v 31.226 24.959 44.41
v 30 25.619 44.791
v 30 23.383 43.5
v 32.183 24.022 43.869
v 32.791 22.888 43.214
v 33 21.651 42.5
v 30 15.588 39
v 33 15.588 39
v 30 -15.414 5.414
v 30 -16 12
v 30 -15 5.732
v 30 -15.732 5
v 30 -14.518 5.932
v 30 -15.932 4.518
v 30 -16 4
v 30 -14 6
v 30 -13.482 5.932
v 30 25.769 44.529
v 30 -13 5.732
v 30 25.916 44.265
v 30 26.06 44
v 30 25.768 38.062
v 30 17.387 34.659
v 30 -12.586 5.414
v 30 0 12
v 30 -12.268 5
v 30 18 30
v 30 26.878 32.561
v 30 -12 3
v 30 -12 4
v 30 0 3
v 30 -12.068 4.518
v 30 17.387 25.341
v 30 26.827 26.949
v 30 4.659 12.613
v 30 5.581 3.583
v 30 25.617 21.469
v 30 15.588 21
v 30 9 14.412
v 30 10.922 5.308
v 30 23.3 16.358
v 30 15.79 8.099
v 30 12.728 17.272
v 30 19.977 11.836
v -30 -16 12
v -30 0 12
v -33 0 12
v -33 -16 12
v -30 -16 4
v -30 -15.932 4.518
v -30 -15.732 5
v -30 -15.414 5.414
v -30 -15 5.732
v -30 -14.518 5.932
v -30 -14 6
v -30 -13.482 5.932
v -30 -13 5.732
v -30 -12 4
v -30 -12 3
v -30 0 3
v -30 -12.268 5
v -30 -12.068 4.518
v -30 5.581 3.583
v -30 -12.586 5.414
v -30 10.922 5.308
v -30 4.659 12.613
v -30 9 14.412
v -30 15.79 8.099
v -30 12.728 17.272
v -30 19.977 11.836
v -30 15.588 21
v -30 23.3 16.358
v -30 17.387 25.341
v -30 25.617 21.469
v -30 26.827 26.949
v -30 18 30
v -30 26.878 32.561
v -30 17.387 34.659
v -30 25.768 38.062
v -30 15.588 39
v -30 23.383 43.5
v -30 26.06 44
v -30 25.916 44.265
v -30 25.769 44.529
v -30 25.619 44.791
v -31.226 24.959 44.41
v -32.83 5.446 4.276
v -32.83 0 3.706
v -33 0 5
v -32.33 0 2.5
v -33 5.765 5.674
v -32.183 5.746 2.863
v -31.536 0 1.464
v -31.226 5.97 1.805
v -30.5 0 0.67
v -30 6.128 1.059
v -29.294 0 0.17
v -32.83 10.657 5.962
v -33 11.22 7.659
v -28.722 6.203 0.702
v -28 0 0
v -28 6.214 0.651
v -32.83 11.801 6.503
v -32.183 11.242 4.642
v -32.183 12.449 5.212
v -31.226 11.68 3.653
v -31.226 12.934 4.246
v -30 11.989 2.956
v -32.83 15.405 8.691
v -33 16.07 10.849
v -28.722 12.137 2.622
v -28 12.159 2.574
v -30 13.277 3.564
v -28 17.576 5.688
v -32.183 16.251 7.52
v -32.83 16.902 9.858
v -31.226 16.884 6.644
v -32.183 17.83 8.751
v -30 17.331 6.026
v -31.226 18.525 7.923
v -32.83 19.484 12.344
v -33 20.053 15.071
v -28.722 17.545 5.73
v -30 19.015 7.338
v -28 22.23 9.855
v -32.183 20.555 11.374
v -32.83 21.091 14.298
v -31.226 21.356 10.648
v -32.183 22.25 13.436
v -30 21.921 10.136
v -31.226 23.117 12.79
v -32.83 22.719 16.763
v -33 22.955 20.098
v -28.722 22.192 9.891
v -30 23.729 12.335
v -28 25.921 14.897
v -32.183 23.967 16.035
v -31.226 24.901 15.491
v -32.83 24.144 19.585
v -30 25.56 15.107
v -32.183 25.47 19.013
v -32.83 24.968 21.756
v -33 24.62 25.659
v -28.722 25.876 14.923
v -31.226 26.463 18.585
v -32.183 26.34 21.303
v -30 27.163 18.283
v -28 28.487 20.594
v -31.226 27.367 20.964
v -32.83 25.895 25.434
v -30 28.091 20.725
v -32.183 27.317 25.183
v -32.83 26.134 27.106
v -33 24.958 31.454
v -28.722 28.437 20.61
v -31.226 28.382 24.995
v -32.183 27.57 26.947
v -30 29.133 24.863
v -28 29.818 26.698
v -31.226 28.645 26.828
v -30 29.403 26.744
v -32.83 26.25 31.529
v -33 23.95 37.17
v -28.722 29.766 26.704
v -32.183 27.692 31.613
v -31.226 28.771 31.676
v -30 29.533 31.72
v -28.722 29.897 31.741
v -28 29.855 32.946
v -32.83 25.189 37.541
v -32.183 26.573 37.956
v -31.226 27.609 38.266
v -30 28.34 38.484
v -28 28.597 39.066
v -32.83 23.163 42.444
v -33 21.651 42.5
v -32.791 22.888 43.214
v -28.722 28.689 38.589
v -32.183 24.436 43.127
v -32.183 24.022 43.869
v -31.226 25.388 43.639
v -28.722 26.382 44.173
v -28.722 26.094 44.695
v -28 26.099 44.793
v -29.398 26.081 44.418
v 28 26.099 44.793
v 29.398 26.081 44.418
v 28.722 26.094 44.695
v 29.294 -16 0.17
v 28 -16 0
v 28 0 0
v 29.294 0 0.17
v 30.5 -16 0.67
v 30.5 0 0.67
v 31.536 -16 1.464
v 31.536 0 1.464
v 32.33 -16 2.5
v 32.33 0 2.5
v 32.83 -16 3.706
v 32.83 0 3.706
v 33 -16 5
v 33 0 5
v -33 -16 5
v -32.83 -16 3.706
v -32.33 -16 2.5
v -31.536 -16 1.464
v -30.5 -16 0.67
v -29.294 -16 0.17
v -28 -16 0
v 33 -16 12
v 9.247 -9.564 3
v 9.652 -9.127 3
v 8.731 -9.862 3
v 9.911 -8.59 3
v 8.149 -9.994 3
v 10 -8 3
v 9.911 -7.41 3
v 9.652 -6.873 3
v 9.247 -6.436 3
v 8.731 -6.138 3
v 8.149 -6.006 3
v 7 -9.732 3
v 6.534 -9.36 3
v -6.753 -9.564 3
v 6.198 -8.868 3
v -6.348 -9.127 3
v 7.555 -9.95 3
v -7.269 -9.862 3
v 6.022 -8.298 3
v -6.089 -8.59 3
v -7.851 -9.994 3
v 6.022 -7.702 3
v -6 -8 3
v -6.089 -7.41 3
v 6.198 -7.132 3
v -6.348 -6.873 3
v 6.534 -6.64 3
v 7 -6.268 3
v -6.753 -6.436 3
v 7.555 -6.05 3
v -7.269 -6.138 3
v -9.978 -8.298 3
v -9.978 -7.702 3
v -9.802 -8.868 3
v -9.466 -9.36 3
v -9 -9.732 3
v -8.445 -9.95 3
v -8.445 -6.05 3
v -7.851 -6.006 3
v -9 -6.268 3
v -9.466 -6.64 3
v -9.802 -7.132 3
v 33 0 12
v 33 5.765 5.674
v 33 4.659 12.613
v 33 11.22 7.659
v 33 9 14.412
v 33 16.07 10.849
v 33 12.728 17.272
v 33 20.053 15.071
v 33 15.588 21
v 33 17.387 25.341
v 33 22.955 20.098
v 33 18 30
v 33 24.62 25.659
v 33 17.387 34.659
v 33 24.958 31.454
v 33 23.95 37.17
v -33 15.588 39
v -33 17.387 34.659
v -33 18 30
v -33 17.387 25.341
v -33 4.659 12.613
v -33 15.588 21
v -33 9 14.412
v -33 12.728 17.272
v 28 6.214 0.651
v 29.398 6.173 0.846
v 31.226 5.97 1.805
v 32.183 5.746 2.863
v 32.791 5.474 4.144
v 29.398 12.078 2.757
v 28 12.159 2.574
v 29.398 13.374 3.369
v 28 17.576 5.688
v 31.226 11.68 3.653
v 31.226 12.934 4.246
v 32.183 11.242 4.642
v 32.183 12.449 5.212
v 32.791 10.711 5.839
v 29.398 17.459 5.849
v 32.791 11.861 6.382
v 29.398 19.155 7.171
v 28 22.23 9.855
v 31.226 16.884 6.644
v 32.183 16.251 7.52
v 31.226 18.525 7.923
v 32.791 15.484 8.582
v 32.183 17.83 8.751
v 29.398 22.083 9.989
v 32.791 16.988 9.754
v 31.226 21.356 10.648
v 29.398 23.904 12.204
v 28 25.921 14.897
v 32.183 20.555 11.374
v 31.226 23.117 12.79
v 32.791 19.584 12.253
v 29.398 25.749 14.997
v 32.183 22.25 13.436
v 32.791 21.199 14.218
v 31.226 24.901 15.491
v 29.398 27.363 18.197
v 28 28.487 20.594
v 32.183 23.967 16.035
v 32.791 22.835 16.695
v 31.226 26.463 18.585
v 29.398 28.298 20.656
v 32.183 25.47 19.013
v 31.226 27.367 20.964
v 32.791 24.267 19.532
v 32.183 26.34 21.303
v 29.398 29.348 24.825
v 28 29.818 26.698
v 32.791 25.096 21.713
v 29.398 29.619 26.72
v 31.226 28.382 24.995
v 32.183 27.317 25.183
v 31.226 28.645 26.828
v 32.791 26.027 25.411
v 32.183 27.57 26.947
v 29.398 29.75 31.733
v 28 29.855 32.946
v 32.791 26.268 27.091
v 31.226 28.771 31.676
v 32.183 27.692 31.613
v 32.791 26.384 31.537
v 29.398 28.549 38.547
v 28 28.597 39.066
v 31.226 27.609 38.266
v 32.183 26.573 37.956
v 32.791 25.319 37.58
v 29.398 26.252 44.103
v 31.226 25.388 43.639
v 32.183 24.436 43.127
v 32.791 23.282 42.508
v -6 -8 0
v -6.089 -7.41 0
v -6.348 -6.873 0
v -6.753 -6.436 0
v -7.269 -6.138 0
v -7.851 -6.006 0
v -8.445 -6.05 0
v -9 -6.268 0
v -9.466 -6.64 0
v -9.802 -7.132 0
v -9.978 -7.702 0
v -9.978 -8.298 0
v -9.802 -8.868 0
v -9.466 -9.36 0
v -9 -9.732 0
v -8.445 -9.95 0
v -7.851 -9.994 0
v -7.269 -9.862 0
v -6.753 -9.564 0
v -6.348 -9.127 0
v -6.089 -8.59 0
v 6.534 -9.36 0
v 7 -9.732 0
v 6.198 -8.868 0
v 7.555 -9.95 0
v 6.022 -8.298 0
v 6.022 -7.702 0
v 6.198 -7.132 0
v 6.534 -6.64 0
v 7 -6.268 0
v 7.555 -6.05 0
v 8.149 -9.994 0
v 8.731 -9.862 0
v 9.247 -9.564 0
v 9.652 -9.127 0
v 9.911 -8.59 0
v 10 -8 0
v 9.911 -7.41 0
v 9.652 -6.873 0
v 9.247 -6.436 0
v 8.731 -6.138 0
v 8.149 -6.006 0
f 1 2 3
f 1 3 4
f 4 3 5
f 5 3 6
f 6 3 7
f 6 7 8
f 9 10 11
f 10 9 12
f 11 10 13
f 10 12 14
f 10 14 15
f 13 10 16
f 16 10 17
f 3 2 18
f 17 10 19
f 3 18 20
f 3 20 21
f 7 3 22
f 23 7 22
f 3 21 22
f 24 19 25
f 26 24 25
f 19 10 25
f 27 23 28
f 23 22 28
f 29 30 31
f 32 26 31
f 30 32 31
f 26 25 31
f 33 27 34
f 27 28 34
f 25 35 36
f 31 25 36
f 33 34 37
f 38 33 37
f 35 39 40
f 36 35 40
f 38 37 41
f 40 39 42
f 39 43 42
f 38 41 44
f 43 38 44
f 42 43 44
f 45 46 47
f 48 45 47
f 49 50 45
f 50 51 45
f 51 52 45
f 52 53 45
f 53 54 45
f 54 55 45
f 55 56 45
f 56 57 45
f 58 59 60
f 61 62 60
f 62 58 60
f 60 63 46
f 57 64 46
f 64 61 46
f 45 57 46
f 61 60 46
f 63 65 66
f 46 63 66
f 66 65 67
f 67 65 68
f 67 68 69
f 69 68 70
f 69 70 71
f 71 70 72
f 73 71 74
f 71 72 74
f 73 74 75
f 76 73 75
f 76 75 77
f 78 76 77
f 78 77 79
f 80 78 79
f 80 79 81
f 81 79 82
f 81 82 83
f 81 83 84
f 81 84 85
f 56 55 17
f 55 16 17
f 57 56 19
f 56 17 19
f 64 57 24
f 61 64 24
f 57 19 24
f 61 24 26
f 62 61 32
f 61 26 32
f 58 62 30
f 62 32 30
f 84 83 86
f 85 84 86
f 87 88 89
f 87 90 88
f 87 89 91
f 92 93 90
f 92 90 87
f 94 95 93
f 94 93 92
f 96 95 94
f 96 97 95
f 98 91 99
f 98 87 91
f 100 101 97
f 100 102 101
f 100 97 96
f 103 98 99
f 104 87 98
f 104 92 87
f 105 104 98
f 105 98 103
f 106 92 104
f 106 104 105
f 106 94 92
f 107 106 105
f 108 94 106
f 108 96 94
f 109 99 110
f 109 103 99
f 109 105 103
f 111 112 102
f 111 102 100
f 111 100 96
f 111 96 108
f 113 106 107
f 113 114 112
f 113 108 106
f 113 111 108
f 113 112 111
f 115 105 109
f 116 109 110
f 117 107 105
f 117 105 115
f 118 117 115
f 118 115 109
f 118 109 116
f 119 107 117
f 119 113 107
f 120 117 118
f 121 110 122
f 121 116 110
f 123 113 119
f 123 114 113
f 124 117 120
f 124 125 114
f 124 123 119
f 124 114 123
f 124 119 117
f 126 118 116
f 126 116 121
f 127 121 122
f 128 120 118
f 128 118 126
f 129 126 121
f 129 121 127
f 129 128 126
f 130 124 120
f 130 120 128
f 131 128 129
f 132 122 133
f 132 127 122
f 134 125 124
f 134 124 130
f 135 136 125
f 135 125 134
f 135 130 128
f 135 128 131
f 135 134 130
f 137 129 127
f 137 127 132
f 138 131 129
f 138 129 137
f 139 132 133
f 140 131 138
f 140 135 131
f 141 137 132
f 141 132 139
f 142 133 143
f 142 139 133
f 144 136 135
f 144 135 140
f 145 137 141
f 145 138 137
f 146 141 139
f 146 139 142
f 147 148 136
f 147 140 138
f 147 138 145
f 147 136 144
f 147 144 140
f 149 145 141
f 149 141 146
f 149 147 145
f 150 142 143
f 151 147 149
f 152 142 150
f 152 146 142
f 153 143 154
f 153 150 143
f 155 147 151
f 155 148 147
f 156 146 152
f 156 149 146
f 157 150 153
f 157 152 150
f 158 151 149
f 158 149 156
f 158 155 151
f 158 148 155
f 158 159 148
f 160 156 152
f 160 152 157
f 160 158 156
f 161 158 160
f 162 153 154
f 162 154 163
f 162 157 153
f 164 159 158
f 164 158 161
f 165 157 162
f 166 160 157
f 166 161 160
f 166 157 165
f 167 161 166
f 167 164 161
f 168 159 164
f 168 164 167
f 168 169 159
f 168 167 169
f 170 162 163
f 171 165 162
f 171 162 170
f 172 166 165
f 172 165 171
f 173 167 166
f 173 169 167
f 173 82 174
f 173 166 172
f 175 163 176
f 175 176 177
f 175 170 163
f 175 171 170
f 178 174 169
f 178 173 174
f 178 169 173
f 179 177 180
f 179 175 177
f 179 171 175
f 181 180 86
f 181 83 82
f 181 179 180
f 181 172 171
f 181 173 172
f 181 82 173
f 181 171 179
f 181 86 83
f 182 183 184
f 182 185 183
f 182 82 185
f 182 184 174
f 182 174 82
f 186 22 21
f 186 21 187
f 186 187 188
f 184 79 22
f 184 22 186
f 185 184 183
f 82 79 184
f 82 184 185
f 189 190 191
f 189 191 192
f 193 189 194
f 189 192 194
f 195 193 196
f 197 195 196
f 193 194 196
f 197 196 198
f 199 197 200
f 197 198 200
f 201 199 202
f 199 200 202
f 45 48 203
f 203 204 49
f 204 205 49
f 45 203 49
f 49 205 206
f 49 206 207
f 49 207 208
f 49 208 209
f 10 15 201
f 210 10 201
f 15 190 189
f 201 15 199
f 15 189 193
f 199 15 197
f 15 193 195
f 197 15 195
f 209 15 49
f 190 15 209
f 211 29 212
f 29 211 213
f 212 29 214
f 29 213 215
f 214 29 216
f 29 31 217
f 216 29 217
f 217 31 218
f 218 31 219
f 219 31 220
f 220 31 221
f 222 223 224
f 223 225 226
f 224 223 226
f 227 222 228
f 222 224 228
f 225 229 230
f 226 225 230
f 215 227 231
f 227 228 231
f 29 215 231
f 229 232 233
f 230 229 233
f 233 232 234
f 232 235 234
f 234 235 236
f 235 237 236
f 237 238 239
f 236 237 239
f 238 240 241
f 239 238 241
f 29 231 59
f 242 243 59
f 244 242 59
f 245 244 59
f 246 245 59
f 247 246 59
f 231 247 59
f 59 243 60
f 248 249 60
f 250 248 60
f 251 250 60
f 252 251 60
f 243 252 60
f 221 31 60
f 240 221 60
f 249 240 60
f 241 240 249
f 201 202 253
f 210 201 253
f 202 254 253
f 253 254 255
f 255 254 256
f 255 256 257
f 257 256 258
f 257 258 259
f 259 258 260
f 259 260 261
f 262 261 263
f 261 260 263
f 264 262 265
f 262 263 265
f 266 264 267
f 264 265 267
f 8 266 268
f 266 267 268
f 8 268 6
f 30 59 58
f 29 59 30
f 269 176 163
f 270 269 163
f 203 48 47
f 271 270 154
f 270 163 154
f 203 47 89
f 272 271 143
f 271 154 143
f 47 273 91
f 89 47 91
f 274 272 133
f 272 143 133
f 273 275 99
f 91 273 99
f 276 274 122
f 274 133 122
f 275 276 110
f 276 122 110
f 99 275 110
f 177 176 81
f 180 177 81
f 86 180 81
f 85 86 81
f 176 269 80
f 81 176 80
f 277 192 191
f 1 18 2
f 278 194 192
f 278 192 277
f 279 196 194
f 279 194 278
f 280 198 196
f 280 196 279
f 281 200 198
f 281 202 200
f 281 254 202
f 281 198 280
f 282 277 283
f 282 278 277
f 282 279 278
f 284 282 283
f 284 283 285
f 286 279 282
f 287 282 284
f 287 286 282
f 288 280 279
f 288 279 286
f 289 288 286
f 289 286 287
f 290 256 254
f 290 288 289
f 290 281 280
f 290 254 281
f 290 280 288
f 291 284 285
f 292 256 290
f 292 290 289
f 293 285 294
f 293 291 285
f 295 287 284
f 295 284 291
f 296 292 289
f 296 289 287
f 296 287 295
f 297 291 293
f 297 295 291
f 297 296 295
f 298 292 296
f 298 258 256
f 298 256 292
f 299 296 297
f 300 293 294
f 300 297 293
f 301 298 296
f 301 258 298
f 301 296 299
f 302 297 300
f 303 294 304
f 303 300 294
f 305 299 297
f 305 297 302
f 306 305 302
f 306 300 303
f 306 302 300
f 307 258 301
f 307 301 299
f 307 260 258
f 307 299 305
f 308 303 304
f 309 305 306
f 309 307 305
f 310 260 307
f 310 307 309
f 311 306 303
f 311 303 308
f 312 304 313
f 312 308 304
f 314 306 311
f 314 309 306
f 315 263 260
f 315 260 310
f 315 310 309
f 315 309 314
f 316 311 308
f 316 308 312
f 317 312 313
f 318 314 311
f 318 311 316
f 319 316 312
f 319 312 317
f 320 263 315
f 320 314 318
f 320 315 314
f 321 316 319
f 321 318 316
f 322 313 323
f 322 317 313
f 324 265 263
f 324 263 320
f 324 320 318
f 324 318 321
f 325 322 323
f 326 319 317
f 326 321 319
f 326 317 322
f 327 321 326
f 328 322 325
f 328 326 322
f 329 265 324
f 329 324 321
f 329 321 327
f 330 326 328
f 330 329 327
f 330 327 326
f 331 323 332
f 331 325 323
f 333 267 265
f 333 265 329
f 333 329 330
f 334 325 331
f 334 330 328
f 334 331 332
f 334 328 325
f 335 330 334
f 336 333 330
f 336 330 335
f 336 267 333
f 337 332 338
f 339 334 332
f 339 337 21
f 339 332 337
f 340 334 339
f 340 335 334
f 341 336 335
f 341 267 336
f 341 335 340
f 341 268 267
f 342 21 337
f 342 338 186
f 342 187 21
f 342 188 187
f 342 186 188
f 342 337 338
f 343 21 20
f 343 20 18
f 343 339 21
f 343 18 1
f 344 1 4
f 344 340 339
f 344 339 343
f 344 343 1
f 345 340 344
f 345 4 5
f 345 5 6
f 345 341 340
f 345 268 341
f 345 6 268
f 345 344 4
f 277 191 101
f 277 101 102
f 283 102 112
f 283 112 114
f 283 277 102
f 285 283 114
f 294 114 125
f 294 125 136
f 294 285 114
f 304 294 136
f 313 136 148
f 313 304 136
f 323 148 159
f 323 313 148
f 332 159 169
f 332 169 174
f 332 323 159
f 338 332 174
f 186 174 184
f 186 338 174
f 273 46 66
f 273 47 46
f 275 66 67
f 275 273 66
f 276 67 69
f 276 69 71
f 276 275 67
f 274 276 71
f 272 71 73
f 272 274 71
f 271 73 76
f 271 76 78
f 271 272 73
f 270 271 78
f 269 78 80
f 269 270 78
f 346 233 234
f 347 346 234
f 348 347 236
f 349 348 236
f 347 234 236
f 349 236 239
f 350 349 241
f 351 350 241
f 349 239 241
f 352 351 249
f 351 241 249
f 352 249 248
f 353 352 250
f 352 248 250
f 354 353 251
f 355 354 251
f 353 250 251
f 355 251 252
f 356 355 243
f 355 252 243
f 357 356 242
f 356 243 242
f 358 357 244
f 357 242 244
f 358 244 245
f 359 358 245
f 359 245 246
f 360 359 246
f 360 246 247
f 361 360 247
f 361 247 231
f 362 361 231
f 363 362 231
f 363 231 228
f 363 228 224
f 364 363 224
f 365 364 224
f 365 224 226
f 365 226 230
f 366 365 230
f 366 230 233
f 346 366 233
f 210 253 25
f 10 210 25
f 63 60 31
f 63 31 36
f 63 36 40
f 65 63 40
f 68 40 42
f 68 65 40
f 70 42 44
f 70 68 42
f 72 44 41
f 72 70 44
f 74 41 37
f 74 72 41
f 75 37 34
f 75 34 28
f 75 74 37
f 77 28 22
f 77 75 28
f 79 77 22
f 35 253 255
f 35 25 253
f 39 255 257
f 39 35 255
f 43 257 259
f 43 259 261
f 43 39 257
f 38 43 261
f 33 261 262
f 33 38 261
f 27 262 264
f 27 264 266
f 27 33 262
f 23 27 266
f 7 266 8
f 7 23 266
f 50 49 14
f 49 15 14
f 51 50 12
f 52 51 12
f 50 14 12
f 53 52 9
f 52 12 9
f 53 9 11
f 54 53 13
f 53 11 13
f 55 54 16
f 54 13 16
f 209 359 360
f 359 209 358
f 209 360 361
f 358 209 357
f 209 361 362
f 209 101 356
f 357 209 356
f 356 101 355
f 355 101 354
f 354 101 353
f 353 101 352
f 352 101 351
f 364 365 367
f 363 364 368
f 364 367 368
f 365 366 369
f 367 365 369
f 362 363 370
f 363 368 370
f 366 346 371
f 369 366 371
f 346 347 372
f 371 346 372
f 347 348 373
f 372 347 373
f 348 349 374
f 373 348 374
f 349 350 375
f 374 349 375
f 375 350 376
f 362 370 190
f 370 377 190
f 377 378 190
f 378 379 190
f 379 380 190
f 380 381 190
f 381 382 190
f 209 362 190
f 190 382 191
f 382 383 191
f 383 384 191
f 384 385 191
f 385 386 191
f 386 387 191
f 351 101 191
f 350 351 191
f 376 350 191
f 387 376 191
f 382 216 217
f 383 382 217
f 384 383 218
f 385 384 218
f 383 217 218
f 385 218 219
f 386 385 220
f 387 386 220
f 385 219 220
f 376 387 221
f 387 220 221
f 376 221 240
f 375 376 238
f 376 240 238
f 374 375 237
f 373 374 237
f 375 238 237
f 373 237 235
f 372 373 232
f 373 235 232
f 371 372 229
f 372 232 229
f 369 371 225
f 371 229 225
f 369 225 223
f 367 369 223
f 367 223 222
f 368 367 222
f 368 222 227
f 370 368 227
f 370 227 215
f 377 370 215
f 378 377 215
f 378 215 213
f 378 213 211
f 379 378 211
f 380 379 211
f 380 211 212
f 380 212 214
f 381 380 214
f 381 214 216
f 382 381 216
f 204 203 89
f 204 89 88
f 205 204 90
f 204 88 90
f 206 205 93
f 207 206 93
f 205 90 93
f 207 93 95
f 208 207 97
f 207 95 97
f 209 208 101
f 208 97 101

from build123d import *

# Parameters (mm, degrees)
F1_ANGLE    = 120
F2_T1_DEPTH = 60
F3_T2_ANGLE = 167.7805884334
F3_T4_ANGLE = 167.7805884334
F4_DEPTH    = 16
F5_R        = 2
F6_DEPTH    = 3.0010001
F5_W        = 60
F5_H        = 4
F7_DEPTH    = 3
F8_R        = 1.99999


# Not quite as in the source:
# - a fillet or chamfer that OpenCascade refuses, or shapes differently, is made with other operations: its cross-section is extruded or revolved along the edge and cut away or added
# - a fillet or chamfer is up to 0.001 mm smaller than in the source, because OpenCascade refuses the exact size


with BuildPart() as f1:
    # F0 (on Front) → F1 (revolve)
    with BuildSketch(Plane.XZ):
        Polygon((-33, 12), (-33, 0), (33, 0), (33, 12), (30, 12), (30, 3), (-30, 3), (-30, 12), align=None)
    revolve(axis=Axis((7.0132222027, 0, 30), (1, 0, 0)), revolution_arc=F1_ANGLE)

    # F2: chamfer of 3.9 x 6.7549981495 on 1 edges, made by hand

    # F2_s2 → F2_t1 (cut)
    with BuildSketch(Plane.YZ.offset(-30)):
        with BuildLine():
            Line((25.7683341911, 38.0618207012), (26.1129278328, 45.0763059136))
            Line((26.1129278328, 45.0763059136), (23.3826859022, 43.5))
            ThreePointArc((23.3826859022, 43.5), (24.7742012809, 40.7349406562), (25.7683341911, 38.0618207012))
        make_face()
    extrude(amount=F2_T1_DEPTH, mode=Mode.SUBTRACT)

    # F3: fillet of radius 5 on 2 edges, made by hand

    # F3_s1 → F3_t2 (revolve, cut)
    with BuildSketch(Plane(origin=(0, -11.1086546654, 4.9204270168), x_dir=(1, 0, 0), z_dir=(0, -0.9143225722, 0.4049867083))):
        with BuildLine():
            ThreePointArc((28, -2.5703228328), (31.5355339059, -1.1058567387), (33, 2.4296771672))
            Line((33, 2.4296771672), (33, -2.5703228328))
            Line((33, -2.5703228328), (28, -2.5703228328))
        make_face()
    revolve(axis=Axis((33, 0, 30), (1, 0, 0)), revolution_arc=F3_T2_ANGLE, mode=Mode.SUBTRACT)

    # F3_s3 → F3_t4 (revolve, cut)
    with BuildSketch(Plane(origin=(0, -11.1086546654, 4.9204270168), x_dir=(1, 0, 0), z_dir=(0, -0.9143225722, 0.4049867083))):
        with BuildLine():
            ThreePointArc((-33, 2.4296771672), (-31.5355339059, -1.1058567387), (-28, -2.5703228328))
            Line((-28, -2.5703228328), (-33, -2.5703228328))
            Line((-33, -2.5703228328), (-33, 2.4296771672))
        make_face()
    revolve(axis=Axis((-33, 0, 30), (1, 0, 0)), revolution_arc=F3_T4_ANGLE, mode=Mode.SUBTRACT)

    # F4 (add): a face of the model
    f4_faces = [f1.faces().sort_by_distance(p)[0] for p in [
        (0, 0, 2.8599348039),
    ]]
    extrude(f4_faces, amount=F4_DEPTH)

    # F5 (on face) → F6 (cut, through all)
    with BuildSketch(Plane.XY.offset(3)):
        with Locations((-8, -8)):
            Circle(F5_R)
        with Locations((8, -8)):
            Circle(F5_R)
    extrude(amount=-F6_DEPTH, mode=Mode.SUBTRACT)

    # F5 (on face) → F7 (join)
    with BuildSketch(Plane.XY.offset(3)):
        with Locations((0, -14)):
            Rectangle(F5_W, F5_H)
    extrude(amount=F7_DEPTH)

    # F8 (radius 2 in the source; OpenCascade refuses exactly that, so slightly less here)
    f8_edges = [f1.edges().sort_by_distance(p)[0] for p in [
        (0, -16, 6),
        (0, -12, 6),
    ]]
    fillet(f8_edges, radius=F8_R)


solid = f1.part
